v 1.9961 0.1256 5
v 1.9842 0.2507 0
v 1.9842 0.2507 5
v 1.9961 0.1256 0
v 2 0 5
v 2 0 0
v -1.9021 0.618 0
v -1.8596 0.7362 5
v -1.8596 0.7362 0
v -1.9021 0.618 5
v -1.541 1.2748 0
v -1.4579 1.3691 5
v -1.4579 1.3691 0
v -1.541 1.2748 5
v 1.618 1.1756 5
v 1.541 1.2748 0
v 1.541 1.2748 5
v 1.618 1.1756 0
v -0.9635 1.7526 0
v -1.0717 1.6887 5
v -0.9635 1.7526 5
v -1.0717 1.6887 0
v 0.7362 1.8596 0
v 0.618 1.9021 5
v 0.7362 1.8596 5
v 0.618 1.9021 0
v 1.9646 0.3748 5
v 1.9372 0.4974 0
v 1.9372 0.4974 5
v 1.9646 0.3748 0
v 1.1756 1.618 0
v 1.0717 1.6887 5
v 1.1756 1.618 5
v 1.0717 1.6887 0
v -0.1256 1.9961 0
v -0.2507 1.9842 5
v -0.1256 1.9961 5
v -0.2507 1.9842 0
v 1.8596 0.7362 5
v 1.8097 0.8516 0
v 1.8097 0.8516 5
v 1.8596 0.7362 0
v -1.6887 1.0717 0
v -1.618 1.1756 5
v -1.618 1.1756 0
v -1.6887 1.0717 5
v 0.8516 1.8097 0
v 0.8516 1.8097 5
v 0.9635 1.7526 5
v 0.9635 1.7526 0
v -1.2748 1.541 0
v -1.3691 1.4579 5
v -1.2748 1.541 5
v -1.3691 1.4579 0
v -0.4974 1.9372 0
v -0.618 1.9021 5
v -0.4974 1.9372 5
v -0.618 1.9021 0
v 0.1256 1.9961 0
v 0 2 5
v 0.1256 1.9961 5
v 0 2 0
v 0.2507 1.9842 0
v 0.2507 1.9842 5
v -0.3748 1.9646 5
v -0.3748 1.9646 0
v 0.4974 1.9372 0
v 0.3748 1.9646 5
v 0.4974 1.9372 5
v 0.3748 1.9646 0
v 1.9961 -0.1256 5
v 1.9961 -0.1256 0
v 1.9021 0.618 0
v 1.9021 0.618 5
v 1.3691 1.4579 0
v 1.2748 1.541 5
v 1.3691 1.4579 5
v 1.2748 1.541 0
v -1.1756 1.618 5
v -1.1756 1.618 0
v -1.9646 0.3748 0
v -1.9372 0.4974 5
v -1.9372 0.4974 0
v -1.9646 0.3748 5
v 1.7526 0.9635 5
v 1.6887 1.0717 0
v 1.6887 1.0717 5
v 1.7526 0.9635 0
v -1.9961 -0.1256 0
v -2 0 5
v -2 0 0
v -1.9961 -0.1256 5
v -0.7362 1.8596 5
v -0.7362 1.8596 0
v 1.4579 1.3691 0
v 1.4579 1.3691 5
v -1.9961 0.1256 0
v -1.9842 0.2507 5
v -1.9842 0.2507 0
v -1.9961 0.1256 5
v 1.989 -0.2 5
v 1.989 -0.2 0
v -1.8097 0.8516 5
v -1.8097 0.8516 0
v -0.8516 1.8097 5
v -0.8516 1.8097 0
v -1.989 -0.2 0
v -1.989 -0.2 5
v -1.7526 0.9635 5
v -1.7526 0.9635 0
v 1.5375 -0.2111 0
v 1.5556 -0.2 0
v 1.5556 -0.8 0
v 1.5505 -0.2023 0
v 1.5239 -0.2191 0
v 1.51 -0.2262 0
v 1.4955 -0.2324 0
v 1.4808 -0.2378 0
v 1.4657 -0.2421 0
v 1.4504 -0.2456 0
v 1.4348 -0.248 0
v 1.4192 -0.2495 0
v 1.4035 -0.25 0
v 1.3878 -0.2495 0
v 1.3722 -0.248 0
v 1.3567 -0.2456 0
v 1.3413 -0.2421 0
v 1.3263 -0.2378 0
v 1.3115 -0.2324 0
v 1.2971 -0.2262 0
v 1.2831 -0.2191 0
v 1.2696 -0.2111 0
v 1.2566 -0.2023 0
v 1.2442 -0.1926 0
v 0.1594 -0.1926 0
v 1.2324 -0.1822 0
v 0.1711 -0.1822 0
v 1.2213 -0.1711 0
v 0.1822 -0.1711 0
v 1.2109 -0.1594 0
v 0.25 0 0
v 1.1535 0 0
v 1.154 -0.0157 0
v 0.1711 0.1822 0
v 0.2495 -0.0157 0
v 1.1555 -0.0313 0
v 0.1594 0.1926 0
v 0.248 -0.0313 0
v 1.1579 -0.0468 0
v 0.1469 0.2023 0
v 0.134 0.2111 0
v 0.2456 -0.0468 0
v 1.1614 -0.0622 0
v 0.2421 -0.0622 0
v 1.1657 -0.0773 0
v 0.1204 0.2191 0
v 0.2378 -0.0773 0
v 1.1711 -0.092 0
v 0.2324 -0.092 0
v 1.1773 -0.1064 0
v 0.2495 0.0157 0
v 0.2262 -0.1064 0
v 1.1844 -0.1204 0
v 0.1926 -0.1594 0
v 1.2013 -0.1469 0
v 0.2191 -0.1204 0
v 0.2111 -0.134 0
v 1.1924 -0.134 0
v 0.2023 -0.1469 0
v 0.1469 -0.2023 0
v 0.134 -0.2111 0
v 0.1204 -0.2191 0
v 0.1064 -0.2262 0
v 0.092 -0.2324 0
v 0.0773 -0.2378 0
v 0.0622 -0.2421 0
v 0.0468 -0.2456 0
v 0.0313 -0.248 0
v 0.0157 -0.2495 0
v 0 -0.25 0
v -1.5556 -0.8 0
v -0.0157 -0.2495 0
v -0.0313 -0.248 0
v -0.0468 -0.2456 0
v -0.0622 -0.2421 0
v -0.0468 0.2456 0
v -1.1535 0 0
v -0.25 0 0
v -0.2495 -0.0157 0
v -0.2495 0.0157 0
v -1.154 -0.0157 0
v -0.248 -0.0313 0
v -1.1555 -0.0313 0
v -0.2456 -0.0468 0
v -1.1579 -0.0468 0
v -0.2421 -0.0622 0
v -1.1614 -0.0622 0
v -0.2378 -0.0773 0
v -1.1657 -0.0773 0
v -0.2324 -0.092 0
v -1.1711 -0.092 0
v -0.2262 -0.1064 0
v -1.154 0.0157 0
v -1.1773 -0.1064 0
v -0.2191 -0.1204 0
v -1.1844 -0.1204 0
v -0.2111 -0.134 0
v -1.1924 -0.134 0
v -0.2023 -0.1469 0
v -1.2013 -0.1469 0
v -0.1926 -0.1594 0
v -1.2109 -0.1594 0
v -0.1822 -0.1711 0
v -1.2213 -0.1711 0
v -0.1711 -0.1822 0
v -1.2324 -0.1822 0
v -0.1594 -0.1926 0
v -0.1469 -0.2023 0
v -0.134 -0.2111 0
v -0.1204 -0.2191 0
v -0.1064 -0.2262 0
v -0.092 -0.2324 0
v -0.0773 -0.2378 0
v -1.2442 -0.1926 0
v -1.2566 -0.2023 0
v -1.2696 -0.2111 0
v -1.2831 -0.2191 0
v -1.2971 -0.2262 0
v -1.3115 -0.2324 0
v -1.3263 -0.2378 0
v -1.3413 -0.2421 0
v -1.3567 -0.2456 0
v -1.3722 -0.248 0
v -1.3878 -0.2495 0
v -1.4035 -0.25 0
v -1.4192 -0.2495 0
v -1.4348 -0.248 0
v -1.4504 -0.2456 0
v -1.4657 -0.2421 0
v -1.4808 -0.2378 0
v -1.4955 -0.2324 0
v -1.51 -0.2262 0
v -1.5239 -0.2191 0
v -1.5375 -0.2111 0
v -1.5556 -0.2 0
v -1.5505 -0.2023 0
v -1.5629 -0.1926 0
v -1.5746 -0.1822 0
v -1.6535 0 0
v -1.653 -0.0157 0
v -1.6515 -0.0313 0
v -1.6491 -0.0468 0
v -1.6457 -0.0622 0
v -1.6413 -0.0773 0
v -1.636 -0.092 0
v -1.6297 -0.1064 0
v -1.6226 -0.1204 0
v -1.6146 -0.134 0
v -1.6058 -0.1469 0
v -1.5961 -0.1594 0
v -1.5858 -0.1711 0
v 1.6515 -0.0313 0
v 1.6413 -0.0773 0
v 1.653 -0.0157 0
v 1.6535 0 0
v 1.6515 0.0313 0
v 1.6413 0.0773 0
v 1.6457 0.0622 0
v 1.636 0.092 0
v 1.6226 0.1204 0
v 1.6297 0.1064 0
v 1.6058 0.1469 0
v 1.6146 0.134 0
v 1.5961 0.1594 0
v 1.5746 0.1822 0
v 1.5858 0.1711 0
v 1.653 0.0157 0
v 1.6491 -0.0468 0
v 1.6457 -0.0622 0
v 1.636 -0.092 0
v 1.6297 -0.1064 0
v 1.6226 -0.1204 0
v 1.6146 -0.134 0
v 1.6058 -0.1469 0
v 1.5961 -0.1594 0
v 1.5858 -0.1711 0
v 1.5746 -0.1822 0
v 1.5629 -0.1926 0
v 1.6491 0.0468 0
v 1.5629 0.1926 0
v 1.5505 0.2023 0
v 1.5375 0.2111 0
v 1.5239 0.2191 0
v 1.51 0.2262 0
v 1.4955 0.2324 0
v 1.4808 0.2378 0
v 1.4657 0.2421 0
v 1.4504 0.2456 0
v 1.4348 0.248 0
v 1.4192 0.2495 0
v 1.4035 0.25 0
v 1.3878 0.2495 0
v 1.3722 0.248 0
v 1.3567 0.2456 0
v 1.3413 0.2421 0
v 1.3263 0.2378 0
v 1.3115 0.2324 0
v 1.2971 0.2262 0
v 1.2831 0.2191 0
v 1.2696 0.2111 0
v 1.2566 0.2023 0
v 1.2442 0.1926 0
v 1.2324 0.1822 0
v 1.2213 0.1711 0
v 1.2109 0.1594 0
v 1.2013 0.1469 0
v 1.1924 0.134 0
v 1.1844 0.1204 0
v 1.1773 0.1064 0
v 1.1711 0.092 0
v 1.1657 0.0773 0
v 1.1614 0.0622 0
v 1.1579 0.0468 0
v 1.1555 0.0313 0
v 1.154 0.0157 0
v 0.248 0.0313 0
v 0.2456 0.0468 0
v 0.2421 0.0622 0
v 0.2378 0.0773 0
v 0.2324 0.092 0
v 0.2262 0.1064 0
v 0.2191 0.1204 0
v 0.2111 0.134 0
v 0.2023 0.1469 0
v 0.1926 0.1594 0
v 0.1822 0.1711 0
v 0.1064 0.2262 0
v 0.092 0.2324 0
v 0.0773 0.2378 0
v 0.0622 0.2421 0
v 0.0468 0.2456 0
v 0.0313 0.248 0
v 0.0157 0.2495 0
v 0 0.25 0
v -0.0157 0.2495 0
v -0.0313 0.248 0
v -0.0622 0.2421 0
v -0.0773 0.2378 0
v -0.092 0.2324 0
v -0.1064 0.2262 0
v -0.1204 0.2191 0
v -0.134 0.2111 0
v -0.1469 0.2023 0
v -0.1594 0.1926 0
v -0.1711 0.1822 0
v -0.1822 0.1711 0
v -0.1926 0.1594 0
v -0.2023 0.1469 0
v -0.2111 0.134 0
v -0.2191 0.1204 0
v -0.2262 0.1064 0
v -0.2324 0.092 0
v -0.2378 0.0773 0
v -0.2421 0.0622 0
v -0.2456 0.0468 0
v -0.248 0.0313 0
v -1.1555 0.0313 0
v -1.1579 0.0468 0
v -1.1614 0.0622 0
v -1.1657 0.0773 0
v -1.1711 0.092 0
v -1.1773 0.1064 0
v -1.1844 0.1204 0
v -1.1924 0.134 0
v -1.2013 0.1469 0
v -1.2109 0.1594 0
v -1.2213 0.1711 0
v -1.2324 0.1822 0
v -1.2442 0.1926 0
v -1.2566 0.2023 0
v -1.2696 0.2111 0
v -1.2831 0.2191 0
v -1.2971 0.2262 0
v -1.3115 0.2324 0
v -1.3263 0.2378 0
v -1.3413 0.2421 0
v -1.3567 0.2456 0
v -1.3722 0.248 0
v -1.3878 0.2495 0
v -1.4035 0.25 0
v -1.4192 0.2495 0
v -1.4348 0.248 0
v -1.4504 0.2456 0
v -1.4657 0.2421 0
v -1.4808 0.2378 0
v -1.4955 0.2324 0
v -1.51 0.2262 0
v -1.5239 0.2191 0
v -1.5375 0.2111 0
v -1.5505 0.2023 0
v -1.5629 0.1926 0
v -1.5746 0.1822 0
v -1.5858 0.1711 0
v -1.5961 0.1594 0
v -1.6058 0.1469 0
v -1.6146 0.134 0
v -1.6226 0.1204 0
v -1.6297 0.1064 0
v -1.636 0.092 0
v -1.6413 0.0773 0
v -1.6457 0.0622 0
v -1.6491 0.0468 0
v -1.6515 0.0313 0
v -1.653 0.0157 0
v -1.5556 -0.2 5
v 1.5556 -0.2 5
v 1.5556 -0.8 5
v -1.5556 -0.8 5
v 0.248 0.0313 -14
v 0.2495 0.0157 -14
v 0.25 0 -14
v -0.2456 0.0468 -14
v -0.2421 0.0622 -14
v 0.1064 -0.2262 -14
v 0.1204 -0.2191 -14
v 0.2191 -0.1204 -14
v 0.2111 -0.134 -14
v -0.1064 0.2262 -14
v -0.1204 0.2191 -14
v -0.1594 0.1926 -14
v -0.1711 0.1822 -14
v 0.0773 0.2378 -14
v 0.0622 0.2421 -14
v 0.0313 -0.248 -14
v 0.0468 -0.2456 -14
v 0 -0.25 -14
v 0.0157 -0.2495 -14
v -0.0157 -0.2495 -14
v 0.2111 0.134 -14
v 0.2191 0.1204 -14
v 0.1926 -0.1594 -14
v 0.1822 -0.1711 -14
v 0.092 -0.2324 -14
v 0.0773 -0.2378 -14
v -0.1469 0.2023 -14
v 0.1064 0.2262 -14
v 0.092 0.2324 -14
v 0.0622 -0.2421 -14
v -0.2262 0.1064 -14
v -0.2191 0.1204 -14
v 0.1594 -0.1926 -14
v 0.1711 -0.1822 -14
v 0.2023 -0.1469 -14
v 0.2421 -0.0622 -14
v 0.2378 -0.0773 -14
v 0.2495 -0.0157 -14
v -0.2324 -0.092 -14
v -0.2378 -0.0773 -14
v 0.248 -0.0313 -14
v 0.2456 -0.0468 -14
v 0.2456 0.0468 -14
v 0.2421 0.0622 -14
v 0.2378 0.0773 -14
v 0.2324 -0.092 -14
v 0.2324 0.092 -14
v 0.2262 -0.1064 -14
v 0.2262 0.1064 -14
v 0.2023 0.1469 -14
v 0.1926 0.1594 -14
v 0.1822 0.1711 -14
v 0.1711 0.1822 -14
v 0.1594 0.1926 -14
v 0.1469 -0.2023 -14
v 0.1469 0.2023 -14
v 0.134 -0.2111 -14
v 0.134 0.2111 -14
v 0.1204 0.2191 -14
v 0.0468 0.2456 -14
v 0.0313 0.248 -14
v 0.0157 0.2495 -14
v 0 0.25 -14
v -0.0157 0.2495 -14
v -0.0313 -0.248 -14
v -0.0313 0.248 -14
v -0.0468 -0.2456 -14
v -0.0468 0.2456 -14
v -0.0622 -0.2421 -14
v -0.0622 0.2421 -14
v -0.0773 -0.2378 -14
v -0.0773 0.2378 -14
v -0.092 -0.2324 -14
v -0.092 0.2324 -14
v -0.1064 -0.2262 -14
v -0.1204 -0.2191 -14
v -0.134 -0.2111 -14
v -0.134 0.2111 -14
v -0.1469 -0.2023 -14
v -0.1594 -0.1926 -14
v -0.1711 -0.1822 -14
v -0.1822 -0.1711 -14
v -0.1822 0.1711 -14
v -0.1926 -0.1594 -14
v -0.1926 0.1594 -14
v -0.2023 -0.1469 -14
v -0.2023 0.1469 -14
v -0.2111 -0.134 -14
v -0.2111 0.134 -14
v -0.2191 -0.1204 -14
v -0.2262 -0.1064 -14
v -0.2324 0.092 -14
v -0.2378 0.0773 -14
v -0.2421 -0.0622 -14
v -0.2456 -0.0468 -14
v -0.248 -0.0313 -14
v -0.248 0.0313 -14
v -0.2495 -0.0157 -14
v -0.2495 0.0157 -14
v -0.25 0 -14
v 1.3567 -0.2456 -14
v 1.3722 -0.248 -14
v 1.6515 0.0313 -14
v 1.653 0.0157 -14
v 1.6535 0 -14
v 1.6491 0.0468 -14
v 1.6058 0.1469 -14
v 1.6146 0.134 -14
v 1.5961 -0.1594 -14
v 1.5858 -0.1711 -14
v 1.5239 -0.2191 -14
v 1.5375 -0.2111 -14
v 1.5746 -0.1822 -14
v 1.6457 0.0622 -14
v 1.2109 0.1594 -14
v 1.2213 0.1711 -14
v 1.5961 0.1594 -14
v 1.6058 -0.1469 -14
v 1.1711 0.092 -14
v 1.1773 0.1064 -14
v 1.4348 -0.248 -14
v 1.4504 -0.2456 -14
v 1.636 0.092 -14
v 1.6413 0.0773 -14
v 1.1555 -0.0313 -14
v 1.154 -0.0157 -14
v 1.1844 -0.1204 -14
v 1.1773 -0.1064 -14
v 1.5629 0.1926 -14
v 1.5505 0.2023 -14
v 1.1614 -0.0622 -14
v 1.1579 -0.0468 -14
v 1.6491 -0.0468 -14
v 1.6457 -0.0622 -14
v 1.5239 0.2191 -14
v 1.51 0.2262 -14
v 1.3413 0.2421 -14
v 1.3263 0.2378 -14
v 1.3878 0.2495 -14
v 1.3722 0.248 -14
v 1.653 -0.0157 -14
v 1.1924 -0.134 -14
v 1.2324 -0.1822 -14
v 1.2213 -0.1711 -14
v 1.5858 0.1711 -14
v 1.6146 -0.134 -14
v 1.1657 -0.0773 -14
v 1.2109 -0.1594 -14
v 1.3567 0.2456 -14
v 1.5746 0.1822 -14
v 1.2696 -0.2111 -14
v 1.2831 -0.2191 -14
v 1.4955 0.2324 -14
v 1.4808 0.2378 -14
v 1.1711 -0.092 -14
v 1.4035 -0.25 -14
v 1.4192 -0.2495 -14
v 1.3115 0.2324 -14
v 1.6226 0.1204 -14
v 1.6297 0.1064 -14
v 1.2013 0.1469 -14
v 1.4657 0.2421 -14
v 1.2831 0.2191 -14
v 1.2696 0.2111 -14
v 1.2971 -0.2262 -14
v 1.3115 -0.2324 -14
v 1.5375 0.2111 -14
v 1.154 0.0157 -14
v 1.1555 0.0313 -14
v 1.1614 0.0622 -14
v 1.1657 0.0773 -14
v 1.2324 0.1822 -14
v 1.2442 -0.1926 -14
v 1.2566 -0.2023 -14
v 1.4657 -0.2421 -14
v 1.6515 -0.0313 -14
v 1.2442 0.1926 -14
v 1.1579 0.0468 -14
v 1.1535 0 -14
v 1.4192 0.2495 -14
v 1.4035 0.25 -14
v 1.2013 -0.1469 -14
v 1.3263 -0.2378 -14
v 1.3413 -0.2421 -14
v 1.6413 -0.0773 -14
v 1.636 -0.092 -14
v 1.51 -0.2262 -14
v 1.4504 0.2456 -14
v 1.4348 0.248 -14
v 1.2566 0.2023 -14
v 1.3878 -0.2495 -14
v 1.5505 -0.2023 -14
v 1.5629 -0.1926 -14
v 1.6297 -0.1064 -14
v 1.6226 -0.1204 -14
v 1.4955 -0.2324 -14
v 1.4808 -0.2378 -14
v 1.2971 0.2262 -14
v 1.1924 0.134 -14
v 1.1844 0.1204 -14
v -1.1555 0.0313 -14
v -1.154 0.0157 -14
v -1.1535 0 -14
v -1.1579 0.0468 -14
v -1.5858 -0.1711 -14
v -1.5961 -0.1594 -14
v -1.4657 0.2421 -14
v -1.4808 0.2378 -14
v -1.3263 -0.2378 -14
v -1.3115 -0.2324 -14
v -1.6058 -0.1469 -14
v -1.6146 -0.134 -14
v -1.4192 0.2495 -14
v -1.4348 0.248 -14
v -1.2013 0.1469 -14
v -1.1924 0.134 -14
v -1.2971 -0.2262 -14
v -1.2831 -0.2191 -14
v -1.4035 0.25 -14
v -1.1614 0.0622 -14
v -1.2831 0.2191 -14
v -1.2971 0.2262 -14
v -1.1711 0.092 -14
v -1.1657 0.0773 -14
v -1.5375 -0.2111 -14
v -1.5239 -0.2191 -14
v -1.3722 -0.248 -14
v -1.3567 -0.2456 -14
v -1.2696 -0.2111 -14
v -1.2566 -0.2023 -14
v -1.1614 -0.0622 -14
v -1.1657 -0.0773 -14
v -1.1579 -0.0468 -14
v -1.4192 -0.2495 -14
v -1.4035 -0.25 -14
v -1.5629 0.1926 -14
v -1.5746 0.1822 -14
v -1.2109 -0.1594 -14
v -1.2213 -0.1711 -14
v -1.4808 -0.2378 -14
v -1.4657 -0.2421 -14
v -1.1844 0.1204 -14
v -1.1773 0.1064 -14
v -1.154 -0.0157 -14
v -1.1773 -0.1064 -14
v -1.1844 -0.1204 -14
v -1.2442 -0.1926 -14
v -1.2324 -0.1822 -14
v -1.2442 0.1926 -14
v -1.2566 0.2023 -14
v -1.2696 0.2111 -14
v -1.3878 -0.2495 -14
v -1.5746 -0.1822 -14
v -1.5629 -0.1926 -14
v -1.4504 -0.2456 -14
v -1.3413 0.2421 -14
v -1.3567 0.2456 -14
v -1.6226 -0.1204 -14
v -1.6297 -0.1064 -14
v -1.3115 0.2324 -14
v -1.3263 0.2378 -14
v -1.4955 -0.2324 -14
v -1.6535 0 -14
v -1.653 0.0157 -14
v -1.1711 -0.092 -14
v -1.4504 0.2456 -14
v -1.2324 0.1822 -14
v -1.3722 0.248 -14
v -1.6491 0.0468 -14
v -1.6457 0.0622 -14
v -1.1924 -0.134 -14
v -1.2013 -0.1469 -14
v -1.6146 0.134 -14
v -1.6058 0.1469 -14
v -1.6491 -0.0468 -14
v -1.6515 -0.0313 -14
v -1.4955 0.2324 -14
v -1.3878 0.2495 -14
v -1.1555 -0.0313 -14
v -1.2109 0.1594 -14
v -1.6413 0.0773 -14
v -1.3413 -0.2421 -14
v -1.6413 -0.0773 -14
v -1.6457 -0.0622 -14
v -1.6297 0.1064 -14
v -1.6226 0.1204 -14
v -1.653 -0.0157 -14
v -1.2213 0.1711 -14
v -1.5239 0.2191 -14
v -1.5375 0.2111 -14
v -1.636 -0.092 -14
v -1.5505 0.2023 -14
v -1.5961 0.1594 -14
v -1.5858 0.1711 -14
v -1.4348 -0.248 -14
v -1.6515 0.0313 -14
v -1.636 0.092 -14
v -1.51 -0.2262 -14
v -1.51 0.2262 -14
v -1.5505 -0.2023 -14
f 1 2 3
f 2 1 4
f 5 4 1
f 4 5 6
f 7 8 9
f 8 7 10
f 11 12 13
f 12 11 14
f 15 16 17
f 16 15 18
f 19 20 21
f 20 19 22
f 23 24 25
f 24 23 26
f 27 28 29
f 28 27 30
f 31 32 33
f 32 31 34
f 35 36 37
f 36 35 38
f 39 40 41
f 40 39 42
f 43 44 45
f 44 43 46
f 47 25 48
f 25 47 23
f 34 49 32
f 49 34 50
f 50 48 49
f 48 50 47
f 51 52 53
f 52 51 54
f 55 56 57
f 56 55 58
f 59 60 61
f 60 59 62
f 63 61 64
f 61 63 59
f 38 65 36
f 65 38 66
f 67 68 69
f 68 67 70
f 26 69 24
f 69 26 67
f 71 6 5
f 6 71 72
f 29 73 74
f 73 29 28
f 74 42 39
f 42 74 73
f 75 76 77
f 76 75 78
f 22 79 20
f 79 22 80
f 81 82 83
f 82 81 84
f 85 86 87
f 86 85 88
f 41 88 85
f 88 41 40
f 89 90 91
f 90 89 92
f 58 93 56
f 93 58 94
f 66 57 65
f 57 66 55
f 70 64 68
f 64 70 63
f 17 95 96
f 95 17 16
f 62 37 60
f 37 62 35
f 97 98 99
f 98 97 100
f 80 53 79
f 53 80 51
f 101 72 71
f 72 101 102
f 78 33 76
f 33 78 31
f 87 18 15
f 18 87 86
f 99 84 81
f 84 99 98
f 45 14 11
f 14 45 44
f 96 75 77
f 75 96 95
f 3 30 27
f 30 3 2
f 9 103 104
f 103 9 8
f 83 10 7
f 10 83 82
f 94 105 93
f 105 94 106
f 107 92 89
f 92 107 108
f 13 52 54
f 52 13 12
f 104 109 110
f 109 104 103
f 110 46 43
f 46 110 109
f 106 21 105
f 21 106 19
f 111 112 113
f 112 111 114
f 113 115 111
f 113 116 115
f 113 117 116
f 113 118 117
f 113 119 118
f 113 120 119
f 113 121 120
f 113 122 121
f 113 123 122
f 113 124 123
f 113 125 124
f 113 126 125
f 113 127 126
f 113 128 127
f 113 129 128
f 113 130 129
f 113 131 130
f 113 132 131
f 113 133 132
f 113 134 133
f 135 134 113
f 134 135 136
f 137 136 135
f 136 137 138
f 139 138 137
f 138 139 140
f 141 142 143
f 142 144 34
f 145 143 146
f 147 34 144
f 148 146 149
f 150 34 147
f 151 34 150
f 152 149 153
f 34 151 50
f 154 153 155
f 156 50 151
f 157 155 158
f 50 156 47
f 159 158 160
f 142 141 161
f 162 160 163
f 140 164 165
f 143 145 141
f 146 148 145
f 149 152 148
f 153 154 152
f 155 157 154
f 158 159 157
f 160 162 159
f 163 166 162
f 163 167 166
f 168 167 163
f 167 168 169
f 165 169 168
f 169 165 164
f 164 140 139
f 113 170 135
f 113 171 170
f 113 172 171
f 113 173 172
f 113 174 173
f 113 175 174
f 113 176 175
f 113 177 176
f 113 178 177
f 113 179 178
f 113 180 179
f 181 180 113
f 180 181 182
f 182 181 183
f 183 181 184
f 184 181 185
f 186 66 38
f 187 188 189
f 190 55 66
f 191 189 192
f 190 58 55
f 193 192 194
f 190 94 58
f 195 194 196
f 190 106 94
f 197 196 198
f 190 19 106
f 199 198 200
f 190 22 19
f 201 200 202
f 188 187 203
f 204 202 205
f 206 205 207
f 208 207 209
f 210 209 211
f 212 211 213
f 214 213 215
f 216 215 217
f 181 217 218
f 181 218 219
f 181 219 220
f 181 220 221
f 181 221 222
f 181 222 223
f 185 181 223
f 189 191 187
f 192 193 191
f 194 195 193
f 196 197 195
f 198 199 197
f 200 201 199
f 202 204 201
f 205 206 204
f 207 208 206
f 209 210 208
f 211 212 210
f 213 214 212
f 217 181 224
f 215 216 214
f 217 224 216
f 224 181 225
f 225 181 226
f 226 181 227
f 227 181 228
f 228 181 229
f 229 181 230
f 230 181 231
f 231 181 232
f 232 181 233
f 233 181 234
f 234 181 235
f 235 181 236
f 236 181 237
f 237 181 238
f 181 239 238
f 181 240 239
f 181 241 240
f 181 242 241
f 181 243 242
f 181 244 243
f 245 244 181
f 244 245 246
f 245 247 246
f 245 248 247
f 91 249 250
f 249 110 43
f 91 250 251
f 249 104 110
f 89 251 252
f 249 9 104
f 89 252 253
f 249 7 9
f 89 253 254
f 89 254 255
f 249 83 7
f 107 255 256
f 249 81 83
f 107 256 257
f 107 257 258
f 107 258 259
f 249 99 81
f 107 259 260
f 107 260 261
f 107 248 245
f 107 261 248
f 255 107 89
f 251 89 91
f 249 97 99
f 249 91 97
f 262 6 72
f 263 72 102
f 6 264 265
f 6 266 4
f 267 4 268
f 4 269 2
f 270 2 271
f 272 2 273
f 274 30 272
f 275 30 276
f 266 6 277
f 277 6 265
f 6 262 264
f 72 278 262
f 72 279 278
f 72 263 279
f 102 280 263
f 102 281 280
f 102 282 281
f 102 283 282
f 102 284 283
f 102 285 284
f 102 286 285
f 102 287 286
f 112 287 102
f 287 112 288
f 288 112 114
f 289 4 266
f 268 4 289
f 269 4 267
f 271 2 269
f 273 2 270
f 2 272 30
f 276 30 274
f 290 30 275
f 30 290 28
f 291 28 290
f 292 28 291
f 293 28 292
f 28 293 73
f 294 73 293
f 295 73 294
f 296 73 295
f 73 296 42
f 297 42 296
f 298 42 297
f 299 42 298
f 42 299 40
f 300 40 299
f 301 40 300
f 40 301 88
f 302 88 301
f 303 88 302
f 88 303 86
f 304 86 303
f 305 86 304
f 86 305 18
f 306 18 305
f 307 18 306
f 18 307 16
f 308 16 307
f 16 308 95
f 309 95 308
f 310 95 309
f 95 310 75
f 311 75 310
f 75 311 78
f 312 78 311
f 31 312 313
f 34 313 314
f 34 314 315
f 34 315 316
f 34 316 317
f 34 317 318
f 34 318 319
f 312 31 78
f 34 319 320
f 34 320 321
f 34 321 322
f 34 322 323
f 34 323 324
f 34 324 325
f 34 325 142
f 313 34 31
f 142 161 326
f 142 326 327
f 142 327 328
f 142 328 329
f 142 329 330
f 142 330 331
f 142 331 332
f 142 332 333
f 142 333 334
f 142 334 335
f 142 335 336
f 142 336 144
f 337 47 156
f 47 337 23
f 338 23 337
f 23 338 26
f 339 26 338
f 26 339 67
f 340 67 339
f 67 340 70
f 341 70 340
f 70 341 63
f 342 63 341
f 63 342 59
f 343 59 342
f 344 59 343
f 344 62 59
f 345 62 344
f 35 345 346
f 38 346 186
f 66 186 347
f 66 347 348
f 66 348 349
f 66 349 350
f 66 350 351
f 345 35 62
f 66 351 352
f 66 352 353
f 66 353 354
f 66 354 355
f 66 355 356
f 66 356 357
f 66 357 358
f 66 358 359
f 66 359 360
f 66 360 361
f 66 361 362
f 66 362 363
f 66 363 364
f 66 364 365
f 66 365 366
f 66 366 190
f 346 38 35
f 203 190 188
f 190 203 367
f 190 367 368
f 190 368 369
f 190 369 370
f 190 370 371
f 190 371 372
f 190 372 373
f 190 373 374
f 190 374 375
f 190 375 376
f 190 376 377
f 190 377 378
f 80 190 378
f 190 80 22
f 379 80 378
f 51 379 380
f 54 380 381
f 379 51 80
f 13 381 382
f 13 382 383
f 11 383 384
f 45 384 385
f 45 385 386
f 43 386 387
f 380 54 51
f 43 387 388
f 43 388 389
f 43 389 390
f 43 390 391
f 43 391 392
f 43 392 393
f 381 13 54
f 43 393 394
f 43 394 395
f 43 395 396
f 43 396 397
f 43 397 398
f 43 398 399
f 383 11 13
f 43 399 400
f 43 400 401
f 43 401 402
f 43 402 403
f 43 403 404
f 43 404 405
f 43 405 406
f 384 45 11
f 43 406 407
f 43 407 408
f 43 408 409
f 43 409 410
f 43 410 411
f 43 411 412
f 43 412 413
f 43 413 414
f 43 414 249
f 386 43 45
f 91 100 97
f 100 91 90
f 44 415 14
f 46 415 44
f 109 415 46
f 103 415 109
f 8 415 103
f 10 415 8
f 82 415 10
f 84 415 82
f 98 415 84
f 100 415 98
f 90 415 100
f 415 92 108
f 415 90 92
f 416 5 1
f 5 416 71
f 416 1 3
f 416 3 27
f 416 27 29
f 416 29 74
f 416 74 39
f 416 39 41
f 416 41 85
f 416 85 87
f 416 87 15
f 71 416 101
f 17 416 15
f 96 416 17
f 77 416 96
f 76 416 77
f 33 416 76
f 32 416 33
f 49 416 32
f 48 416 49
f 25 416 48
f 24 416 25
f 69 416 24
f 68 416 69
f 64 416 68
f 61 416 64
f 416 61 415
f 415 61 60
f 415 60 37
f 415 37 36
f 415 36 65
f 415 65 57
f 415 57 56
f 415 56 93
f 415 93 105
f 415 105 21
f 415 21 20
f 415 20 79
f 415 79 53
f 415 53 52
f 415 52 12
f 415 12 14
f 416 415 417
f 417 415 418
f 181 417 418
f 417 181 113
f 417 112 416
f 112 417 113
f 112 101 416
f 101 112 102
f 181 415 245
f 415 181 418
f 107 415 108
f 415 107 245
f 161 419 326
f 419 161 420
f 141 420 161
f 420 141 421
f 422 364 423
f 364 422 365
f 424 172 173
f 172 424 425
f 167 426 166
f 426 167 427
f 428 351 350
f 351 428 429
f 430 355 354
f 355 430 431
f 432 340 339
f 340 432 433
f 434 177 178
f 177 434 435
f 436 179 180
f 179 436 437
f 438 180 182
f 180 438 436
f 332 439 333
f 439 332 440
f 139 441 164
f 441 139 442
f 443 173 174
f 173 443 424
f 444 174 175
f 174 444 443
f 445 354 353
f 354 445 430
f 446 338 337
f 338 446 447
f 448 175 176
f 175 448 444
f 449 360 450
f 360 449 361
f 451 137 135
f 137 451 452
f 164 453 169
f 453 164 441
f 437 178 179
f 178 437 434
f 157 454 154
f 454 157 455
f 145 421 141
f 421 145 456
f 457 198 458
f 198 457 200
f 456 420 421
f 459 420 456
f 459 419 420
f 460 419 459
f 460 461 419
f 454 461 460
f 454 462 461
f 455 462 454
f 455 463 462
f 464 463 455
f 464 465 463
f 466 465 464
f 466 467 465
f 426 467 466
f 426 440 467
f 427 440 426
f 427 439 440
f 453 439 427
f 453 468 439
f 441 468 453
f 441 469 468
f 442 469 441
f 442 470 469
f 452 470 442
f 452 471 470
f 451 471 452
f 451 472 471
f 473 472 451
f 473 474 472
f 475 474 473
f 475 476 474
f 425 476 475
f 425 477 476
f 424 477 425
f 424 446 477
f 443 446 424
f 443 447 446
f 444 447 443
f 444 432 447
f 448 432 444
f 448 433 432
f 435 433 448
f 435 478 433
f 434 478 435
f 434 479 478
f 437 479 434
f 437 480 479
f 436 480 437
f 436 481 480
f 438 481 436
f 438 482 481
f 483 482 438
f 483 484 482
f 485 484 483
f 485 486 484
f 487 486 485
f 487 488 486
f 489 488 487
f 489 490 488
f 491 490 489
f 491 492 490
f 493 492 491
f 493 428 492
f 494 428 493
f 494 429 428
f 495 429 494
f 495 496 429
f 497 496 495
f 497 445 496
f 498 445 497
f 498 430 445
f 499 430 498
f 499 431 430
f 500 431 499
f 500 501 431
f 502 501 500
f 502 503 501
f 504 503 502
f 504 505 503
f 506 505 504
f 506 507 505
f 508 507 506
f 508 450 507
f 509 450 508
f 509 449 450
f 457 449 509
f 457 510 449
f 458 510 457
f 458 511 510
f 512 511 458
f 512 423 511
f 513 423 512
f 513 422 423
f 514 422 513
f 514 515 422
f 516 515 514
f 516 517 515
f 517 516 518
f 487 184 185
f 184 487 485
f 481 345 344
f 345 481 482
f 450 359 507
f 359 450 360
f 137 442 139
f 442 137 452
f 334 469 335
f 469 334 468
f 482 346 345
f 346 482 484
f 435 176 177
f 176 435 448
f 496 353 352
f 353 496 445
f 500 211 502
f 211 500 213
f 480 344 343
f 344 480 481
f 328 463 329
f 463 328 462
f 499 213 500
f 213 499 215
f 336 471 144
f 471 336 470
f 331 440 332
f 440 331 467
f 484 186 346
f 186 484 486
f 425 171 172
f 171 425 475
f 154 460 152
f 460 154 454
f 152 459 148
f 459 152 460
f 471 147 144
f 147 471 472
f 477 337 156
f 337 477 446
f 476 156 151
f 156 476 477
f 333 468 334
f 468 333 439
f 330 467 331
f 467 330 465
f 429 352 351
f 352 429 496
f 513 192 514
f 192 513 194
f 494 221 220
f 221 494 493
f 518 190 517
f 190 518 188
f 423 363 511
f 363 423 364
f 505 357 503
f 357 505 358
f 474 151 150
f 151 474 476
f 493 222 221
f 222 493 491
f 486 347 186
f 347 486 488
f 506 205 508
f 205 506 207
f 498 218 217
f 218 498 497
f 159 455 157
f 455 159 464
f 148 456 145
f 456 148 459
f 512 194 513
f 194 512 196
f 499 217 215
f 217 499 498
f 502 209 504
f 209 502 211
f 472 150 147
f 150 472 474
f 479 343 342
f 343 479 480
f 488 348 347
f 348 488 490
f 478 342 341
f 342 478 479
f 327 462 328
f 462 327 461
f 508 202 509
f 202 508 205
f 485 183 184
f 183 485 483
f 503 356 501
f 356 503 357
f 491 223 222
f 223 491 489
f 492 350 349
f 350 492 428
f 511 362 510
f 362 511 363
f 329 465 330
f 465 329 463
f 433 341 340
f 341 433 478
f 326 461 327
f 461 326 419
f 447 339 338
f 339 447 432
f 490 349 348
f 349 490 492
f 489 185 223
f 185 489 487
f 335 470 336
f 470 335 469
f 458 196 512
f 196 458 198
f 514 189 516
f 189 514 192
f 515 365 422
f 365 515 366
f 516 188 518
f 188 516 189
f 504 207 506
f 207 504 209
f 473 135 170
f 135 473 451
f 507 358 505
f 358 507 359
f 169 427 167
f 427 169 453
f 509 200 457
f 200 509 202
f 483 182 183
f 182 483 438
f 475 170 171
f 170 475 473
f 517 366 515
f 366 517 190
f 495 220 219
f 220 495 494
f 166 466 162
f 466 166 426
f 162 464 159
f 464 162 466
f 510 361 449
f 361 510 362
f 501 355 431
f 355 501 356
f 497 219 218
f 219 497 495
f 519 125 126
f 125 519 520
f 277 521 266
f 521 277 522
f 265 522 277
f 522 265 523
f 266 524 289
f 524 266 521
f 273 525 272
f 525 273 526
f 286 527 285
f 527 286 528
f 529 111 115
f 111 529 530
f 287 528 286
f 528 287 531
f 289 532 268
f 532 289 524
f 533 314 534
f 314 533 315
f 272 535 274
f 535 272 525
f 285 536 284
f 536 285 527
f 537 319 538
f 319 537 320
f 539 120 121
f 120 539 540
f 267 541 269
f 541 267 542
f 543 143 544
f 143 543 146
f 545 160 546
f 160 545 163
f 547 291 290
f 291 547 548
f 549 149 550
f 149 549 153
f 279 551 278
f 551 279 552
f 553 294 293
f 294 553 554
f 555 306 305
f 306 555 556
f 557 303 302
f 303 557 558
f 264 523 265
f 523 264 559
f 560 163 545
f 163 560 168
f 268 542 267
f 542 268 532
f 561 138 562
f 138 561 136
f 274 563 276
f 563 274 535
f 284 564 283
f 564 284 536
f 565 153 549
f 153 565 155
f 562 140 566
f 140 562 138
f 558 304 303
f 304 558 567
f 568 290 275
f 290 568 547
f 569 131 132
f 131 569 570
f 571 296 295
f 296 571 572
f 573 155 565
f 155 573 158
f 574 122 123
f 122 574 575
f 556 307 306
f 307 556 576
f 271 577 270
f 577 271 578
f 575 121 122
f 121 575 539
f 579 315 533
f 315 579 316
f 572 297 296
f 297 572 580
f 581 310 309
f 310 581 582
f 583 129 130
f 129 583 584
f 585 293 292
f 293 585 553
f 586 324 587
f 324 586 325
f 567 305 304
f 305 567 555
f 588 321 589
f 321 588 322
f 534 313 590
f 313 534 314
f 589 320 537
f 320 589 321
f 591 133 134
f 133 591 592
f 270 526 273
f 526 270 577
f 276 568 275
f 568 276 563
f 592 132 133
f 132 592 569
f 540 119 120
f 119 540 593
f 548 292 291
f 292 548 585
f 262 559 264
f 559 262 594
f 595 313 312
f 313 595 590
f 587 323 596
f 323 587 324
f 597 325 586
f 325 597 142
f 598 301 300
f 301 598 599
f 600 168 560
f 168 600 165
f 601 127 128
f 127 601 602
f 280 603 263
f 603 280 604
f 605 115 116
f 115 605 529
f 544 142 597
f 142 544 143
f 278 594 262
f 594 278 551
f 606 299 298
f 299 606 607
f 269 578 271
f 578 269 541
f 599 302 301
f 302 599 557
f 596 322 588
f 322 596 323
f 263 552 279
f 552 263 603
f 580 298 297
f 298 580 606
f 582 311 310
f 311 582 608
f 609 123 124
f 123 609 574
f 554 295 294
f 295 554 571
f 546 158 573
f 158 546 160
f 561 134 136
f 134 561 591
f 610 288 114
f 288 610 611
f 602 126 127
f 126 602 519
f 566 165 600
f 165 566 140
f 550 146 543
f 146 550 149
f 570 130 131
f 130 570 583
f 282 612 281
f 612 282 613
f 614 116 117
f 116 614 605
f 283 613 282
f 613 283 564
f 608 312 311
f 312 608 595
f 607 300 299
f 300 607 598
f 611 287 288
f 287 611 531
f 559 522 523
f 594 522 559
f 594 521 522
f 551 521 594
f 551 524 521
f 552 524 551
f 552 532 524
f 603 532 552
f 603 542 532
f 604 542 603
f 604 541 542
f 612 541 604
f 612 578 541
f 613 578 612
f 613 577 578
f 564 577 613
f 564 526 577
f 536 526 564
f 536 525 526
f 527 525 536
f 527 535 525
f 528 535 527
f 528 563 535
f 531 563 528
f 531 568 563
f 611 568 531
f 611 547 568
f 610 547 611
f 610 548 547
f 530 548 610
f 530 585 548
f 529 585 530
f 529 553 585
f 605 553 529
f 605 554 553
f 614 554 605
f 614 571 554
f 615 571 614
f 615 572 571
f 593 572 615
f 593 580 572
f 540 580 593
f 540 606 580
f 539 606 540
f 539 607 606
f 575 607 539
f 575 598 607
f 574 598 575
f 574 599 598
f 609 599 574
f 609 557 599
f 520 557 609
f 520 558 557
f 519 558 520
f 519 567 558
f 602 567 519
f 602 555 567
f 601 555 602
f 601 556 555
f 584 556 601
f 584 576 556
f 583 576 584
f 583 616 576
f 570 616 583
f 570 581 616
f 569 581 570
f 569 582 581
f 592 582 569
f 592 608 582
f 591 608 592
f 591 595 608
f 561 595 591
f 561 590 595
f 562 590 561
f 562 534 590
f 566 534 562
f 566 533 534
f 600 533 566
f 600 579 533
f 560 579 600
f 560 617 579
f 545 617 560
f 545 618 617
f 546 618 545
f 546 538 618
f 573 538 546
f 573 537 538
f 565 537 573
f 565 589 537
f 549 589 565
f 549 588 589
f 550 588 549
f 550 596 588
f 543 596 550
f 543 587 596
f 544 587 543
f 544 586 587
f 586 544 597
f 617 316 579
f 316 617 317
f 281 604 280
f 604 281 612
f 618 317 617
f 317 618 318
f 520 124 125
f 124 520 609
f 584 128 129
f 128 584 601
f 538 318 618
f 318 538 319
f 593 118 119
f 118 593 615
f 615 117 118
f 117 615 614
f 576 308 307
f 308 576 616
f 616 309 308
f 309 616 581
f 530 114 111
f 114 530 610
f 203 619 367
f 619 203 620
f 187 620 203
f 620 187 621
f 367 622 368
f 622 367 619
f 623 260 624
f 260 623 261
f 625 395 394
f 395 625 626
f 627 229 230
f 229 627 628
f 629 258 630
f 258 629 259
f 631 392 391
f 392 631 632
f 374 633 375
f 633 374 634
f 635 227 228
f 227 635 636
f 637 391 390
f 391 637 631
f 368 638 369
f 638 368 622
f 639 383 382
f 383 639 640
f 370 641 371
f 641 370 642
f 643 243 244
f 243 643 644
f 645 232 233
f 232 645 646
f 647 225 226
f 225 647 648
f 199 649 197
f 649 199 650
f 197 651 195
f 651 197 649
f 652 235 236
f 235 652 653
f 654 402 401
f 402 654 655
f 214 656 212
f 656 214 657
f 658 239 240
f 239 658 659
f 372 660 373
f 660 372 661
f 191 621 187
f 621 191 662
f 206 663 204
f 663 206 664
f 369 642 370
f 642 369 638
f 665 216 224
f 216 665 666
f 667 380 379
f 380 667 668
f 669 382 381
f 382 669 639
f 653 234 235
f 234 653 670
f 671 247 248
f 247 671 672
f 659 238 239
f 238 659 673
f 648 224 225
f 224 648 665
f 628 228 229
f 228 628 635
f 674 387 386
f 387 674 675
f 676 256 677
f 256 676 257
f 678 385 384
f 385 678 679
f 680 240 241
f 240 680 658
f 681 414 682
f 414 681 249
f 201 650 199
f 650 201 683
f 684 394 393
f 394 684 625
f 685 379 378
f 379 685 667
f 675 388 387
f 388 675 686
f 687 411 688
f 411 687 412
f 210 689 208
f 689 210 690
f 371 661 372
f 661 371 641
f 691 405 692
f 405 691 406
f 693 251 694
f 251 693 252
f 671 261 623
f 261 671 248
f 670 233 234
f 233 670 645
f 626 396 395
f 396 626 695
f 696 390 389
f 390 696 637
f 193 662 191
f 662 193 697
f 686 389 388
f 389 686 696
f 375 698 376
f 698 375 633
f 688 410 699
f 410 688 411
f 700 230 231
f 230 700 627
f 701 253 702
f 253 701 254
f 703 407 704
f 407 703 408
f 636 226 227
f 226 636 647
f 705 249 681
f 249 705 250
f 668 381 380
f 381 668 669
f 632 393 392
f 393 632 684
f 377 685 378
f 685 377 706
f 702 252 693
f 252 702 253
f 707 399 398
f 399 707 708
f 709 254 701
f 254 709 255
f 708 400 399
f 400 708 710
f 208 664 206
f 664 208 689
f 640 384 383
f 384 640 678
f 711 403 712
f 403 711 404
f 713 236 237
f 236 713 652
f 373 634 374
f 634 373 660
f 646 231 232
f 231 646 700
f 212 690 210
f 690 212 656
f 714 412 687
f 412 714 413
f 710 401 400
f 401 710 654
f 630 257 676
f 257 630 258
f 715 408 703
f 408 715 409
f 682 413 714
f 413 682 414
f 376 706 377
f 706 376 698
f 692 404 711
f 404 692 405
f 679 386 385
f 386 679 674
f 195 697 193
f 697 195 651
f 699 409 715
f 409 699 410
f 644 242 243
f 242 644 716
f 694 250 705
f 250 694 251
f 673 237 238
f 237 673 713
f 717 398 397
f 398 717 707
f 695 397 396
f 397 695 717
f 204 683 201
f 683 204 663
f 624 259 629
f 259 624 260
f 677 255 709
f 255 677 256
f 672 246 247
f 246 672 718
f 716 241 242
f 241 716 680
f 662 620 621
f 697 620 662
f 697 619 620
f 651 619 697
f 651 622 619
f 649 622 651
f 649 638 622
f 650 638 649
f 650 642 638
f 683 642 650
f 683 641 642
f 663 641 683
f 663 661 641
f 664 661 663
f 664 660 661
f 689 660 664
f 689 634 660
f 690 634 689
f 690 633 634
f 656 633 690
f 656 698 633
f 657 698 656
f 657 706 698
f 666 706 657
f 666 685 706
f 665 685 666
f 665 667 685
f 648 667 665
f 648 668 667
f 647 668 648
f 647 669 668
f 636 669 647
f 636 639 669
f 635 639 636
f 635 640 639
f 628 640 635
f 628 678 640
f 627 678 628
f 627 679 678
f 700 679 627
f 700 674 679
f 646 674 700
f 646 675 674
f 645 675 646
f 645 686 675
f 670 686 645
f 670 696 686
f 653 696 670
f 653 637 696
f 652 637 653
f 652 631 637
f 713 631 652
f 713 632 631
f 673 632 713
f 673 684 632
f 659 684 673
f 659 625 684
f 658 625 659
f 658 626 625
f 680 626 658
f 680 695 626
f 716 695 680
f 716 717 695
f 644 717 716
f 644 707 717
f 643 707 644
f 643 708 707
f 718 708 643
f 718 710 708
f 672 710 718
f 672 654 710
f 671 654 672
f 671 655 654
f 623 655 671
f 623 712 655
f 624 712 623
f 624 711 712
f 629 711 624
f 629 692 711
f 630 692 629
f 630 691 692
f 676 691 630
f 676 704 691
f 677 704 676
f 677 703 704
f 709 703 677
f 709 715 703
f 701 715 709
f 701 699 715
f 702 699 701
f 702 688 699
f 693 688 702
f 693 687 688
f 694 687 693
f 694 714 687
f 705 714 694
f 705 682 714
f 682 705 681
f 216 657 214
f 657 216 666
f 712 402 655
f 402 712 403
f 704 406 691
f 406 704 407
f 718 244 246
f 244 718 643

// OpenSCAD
// Units in mm.
dioded = 4;
diode_height = 5;
halfd = dioded/2;
cutoutf_x = dioded/2;
cutoutf_y=1.5;
cutoutf_ys = dioded/2;
xnotch = halfd/4.5;
cutouts_y = dioded;
cutouts_ys = dioded - xnotch;
pindiameter=0.25;
pinheight=3.5*dioded;
pinoffsetx = dioded/2.85;
ff=0.1;    // fudge factor

color([0.45,0.45,0.45]) {
difference() {
  difference() {
    difference() {
      cylinder(r=halfd, h=diode_height, $fn=100);
      translate([-halfd, -2.4*halfd, -ff/2]) cube([dioded, dioded, diode_height+ff]);
    }
    translate([halfd - xnotch, -2.1*halfd, -ff/2]) cube([dioded, dioded, diode_height+ff]);
  }
  translate([-(dioded+halfd-xnotch),-2.1*halfd, -ff/2]) cube([dioded, dioded, diode_height+ff]);
}
}

color([0.95,0.95,0.95]) {
  translate([0,0,-pinheight]) cylinder(r=pindiameter, h=pinheight, $fn=100);
  translate([pinoffsetx,0,-pinheight]) cylinder(r=pindiameter, h=pinheight, $fn=100);
 translate([-pinoffsetx,0,-pinheight]) cylinder(r=pindiameter, h=pinheight, $fn=100);   
}
